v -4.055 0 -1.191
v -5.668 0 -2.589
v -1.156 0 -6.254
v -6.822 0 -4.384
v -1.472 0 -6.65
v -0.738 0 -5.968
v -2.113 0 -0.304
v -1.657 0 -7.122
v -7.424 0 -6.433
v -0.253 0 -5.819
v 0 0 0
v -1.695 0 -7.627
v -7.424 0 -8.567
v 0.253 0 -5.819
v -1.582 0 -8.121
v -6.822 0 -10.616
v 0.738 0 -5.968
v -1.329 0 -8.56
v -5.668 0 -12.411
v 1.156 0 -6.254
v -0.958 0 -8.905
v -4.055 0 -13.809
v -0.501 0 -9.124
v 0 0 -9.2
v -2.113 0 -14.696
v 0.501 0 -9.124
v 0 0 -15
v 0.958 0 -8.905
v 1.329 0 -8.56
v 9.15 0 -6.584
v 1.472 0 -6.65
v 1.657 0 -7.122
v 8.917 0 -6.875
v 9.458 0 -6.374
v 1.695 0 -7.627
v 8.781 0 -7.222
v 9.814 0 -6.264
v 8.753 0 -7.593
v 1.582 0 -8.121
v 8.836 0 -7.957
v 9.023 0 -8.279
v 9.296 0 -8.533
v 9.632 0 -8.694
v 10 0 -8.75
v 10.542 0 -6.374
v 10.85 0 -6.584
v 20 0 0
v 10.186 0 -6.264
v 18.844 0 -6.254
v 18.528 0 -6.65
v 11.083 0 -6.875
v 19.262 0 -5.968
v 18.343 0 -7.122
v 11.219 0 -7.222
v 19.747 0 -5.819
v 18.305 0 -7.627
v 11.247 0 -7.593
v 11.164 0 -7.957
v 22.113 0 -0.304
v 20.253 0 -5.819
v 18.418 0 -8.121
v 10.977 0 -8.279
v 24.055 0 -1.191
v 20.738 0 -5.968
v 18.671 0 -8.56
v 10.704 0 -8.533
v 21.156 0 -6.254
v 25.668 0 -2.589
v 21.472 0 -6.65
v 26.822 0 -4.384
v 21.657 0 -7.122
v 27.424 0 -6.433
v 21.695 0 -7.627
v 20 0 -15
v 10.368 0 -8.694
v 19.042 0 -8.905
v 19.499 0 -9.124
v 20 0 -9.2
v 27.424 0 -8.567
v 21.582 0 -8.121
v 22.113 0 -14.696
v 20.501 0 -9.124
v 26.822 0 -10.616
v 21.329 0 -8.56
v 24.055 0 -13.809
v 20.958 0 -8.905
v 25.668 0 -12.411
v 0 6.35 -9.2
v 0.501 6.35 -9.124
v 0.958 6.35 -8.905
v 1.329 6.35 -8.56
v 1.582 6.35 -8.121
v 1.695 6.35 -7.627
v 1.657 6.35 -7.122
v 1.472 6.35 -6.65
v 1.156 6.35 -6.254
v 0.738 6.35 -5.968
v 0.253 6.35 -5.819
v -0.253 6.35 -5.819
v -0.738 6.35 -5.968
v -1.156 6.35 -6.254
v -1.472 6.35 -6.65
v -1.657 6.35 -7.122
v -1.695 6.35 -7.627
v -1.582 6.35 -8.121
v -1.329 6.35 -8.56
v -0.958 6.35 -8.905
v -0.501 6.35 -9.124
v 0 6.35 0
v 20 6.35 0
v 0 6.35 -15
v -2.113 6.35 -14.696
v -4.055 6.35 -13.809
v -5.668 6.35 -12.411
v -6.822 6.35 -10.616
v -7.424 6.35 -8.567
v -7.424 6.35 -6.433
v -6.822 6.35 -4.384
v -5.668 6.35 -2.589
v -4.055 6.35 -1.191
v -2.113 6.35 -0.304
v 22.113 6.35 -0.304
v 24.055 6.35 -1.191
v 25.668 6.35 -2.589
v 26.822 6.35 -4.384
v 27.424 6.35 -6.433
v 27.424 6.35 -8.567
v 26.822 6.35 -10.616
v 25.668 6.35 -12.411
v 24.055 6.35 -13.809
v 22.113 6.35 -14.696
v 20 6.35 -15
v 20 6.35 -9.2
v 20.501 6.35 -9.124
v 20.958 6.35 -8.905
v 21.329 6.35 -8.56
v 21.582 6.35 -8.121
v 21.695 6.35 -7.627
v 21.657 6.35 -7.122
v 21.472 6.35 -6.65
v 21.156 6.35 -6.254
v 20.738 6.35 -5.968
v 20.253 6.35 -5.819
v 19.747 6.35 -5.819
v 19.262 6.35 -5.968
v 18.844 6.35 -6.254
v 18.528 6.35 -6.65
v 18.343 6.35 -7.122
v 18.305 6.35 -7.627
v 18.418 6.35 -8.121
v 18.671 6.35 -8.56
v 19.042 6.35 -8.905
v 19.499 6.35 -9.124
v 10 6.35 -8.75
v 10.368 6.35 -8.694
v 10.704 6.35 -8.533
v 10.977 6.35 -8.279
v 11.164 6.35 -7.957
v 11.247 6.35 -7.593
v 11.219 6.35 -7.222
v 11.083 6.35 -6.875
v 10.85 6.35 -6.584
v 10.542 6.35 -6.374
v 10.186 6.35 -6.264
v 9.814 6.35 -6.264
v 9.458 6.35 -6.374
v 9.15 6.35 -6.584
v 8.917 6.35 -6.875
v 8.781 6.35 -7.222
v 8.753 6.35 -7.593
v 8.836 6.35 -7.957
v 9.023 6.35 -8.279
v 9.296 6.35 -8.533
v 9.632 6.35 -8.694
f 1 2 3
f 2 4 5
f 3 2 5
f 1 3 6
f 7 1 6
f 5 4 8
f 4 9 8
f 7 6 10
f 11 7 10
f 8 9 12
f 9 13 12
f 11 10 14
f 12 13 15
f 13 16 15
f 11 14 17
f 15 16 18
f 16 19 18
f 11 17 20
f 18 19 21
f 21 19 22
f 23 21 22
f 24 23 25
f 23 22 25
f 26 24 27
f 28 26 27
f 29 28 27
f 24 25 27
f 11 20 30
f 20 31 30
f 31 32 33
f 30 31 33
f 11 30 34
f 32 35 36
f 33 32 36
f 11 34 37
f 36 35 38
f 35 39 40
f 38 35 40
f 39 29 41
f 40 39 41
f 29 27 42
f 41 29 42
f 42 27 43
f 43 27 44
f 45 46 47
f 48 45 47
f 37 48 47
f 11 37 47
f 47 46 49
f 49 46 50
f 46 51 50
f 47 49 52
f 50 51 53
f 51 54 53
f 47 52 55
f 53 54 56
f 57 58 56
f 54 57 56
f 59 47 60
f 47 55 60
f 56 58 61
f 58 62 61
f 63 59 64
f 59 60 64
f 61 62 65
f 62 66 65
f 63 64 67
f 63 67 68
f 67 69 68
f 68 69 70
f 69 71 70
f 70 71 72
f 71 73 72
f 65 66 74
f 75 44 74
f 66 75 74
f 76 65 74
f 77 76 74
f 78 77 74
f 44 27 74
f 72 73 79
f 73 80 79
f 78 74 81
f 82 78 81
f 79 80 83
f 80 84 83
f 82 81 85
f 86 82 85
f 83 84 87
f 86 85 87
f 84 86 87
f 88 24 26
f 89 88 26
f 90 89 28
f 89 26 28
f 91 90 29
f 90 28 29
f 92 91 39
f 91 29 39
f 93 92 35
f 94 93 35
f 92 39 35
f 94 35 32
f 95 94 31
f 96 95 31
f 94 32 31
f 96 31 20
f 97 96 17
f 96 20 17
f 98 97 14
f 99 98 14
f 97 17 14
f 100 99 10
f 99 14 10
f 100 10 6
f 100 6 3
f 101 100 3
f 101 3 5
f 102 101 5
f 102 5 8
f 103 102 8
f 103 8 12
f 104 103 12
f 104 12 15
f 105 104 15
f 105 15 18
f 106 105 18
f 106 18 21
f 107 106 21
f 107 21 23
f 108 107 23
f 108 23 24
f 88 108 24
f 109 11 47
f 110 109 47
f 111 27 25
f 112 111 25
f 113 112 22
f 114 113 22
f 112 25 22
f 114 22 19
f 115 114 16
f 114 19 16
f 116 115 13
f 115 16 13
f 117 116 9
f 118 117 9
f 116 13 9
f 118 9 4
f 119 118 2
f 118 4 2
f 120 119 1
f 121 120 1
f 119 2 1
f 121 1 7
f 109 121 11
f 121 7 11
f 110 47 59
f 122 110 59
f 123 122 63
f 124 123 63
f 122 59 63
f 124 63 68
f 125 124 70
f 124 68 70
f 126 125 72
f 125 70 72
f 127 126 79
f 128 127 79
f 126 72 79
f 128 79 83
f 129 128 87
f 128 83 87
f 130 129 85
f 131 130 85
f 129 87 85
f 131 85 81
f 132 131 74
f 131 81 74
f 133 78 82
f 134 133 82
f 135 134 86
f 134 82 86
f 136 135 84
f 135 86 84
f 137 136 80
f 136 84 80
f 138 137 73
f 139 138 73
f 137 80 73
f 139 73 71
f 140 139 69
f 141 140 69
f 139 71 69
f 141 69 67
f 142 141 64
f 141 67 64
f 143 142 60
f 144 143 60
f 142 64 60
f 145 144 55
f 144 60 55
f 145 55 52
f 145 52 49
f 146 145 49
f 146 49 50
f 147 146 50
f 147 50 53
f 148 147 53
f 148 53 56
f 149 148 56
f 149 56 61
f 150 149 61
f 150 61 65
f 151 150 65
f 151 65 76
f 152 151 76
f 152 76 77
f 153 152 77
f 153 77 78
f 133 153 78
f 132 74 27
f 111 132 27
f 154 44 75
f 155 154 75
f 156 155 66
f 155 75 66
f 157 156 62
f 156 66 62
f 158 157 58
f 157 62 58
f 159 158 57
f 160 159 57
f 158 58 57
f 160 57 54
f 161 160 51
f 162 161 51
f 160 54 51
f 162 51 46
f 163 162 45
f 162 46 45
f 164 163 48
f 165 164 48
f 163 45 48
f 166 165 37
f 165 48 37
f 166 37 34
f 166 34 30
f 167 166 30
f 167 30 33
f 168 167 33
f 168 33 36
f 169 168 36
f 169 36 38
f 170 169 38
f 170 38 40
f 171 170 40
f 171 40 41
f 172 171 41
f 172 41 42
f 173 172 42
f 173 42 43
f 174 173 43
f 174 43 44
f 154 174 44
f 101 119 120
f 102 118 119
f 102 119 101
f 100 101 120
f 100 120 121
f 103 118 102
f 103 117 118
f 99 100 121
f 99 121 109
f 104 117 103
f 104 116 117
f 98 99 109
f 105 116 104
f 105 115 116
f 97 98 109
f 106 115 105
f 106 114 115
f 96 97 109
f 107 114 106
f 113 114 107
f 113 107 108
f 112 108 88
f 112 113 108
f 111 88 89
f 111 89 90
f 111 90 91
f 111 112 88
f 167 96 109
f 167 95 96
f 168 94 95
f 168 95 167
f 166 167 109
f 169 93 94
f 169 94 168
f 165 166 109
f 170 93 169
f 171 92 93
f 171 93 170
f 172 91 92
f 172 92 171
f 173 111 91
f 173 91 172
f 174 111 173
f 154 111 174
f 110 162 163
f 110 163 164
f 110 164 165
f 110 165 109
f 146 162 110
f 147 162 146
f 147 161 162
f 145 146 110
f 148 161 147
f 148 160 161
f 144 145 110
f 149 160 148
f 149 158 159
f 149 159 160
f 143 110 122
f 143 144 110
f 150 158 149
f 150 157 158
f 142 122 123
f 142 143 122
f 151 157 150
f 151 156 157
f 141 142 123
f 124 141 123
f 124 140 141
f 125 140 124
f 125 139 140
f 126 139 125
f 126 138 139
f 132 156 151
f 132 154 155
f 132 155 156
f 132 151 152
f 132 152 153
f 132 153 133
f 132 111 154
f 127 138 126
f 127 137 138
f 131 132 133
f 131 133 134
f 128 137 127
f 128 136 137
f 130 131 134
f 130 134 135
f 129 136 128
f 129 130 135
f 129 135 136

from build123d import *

# Parameters (mm, degrees)
BOSS_EXTRUDE1_DEPTH         = 6.35
M3_CLEARANCE_HOLE1_D        = 3.4
TAP_DRILL_FOR_M3X0_5_TAP1_D = 2.5


with BuildPart() as part:
    # Sketch1 → Boss-Extrude1 (new body)
    with BuildSketch(Plane(origin=(0, 0, 0), x_dir=(1, 0, 0), z_dir=(0, 1, 0))):
        with BuildLine():
            Line((0, 0), (20, 0))
            ThreePointArc((20, 0), (27.5, 7.5), (20, 15))
            Line((20, 15), (0, 15))
            ThreePointArc((0, 15), (-7.5, 7.5), (0, 0))
        make_face()
    extrude(amount=BOSS_EXTRUDE1_DEPTH)

    # M3 Clearance Hole1 (through all)
    with Locations(Plane(origin=(0, 6.35, -7.5), x_dir=(0, 0, 1), z_dir=(0, 1, 0))):
        with Locations((0, 0), (0, 20)):
            Hole(M3_CLEARANCE_HOLE1_D / 2)

    # Tap Drill for M3x0.5 Tap1 (through all)
    with Locations(Plane(origin=(10, 6.35, -7.5), x_dir=(0, 0, 1), z_dir=(0, 1, 0))):
        with Locations((0, 0)):
            Hole(TAP_DRILL_FOR_M3X0_5_TAP1_D / 2)


solid = part.part
